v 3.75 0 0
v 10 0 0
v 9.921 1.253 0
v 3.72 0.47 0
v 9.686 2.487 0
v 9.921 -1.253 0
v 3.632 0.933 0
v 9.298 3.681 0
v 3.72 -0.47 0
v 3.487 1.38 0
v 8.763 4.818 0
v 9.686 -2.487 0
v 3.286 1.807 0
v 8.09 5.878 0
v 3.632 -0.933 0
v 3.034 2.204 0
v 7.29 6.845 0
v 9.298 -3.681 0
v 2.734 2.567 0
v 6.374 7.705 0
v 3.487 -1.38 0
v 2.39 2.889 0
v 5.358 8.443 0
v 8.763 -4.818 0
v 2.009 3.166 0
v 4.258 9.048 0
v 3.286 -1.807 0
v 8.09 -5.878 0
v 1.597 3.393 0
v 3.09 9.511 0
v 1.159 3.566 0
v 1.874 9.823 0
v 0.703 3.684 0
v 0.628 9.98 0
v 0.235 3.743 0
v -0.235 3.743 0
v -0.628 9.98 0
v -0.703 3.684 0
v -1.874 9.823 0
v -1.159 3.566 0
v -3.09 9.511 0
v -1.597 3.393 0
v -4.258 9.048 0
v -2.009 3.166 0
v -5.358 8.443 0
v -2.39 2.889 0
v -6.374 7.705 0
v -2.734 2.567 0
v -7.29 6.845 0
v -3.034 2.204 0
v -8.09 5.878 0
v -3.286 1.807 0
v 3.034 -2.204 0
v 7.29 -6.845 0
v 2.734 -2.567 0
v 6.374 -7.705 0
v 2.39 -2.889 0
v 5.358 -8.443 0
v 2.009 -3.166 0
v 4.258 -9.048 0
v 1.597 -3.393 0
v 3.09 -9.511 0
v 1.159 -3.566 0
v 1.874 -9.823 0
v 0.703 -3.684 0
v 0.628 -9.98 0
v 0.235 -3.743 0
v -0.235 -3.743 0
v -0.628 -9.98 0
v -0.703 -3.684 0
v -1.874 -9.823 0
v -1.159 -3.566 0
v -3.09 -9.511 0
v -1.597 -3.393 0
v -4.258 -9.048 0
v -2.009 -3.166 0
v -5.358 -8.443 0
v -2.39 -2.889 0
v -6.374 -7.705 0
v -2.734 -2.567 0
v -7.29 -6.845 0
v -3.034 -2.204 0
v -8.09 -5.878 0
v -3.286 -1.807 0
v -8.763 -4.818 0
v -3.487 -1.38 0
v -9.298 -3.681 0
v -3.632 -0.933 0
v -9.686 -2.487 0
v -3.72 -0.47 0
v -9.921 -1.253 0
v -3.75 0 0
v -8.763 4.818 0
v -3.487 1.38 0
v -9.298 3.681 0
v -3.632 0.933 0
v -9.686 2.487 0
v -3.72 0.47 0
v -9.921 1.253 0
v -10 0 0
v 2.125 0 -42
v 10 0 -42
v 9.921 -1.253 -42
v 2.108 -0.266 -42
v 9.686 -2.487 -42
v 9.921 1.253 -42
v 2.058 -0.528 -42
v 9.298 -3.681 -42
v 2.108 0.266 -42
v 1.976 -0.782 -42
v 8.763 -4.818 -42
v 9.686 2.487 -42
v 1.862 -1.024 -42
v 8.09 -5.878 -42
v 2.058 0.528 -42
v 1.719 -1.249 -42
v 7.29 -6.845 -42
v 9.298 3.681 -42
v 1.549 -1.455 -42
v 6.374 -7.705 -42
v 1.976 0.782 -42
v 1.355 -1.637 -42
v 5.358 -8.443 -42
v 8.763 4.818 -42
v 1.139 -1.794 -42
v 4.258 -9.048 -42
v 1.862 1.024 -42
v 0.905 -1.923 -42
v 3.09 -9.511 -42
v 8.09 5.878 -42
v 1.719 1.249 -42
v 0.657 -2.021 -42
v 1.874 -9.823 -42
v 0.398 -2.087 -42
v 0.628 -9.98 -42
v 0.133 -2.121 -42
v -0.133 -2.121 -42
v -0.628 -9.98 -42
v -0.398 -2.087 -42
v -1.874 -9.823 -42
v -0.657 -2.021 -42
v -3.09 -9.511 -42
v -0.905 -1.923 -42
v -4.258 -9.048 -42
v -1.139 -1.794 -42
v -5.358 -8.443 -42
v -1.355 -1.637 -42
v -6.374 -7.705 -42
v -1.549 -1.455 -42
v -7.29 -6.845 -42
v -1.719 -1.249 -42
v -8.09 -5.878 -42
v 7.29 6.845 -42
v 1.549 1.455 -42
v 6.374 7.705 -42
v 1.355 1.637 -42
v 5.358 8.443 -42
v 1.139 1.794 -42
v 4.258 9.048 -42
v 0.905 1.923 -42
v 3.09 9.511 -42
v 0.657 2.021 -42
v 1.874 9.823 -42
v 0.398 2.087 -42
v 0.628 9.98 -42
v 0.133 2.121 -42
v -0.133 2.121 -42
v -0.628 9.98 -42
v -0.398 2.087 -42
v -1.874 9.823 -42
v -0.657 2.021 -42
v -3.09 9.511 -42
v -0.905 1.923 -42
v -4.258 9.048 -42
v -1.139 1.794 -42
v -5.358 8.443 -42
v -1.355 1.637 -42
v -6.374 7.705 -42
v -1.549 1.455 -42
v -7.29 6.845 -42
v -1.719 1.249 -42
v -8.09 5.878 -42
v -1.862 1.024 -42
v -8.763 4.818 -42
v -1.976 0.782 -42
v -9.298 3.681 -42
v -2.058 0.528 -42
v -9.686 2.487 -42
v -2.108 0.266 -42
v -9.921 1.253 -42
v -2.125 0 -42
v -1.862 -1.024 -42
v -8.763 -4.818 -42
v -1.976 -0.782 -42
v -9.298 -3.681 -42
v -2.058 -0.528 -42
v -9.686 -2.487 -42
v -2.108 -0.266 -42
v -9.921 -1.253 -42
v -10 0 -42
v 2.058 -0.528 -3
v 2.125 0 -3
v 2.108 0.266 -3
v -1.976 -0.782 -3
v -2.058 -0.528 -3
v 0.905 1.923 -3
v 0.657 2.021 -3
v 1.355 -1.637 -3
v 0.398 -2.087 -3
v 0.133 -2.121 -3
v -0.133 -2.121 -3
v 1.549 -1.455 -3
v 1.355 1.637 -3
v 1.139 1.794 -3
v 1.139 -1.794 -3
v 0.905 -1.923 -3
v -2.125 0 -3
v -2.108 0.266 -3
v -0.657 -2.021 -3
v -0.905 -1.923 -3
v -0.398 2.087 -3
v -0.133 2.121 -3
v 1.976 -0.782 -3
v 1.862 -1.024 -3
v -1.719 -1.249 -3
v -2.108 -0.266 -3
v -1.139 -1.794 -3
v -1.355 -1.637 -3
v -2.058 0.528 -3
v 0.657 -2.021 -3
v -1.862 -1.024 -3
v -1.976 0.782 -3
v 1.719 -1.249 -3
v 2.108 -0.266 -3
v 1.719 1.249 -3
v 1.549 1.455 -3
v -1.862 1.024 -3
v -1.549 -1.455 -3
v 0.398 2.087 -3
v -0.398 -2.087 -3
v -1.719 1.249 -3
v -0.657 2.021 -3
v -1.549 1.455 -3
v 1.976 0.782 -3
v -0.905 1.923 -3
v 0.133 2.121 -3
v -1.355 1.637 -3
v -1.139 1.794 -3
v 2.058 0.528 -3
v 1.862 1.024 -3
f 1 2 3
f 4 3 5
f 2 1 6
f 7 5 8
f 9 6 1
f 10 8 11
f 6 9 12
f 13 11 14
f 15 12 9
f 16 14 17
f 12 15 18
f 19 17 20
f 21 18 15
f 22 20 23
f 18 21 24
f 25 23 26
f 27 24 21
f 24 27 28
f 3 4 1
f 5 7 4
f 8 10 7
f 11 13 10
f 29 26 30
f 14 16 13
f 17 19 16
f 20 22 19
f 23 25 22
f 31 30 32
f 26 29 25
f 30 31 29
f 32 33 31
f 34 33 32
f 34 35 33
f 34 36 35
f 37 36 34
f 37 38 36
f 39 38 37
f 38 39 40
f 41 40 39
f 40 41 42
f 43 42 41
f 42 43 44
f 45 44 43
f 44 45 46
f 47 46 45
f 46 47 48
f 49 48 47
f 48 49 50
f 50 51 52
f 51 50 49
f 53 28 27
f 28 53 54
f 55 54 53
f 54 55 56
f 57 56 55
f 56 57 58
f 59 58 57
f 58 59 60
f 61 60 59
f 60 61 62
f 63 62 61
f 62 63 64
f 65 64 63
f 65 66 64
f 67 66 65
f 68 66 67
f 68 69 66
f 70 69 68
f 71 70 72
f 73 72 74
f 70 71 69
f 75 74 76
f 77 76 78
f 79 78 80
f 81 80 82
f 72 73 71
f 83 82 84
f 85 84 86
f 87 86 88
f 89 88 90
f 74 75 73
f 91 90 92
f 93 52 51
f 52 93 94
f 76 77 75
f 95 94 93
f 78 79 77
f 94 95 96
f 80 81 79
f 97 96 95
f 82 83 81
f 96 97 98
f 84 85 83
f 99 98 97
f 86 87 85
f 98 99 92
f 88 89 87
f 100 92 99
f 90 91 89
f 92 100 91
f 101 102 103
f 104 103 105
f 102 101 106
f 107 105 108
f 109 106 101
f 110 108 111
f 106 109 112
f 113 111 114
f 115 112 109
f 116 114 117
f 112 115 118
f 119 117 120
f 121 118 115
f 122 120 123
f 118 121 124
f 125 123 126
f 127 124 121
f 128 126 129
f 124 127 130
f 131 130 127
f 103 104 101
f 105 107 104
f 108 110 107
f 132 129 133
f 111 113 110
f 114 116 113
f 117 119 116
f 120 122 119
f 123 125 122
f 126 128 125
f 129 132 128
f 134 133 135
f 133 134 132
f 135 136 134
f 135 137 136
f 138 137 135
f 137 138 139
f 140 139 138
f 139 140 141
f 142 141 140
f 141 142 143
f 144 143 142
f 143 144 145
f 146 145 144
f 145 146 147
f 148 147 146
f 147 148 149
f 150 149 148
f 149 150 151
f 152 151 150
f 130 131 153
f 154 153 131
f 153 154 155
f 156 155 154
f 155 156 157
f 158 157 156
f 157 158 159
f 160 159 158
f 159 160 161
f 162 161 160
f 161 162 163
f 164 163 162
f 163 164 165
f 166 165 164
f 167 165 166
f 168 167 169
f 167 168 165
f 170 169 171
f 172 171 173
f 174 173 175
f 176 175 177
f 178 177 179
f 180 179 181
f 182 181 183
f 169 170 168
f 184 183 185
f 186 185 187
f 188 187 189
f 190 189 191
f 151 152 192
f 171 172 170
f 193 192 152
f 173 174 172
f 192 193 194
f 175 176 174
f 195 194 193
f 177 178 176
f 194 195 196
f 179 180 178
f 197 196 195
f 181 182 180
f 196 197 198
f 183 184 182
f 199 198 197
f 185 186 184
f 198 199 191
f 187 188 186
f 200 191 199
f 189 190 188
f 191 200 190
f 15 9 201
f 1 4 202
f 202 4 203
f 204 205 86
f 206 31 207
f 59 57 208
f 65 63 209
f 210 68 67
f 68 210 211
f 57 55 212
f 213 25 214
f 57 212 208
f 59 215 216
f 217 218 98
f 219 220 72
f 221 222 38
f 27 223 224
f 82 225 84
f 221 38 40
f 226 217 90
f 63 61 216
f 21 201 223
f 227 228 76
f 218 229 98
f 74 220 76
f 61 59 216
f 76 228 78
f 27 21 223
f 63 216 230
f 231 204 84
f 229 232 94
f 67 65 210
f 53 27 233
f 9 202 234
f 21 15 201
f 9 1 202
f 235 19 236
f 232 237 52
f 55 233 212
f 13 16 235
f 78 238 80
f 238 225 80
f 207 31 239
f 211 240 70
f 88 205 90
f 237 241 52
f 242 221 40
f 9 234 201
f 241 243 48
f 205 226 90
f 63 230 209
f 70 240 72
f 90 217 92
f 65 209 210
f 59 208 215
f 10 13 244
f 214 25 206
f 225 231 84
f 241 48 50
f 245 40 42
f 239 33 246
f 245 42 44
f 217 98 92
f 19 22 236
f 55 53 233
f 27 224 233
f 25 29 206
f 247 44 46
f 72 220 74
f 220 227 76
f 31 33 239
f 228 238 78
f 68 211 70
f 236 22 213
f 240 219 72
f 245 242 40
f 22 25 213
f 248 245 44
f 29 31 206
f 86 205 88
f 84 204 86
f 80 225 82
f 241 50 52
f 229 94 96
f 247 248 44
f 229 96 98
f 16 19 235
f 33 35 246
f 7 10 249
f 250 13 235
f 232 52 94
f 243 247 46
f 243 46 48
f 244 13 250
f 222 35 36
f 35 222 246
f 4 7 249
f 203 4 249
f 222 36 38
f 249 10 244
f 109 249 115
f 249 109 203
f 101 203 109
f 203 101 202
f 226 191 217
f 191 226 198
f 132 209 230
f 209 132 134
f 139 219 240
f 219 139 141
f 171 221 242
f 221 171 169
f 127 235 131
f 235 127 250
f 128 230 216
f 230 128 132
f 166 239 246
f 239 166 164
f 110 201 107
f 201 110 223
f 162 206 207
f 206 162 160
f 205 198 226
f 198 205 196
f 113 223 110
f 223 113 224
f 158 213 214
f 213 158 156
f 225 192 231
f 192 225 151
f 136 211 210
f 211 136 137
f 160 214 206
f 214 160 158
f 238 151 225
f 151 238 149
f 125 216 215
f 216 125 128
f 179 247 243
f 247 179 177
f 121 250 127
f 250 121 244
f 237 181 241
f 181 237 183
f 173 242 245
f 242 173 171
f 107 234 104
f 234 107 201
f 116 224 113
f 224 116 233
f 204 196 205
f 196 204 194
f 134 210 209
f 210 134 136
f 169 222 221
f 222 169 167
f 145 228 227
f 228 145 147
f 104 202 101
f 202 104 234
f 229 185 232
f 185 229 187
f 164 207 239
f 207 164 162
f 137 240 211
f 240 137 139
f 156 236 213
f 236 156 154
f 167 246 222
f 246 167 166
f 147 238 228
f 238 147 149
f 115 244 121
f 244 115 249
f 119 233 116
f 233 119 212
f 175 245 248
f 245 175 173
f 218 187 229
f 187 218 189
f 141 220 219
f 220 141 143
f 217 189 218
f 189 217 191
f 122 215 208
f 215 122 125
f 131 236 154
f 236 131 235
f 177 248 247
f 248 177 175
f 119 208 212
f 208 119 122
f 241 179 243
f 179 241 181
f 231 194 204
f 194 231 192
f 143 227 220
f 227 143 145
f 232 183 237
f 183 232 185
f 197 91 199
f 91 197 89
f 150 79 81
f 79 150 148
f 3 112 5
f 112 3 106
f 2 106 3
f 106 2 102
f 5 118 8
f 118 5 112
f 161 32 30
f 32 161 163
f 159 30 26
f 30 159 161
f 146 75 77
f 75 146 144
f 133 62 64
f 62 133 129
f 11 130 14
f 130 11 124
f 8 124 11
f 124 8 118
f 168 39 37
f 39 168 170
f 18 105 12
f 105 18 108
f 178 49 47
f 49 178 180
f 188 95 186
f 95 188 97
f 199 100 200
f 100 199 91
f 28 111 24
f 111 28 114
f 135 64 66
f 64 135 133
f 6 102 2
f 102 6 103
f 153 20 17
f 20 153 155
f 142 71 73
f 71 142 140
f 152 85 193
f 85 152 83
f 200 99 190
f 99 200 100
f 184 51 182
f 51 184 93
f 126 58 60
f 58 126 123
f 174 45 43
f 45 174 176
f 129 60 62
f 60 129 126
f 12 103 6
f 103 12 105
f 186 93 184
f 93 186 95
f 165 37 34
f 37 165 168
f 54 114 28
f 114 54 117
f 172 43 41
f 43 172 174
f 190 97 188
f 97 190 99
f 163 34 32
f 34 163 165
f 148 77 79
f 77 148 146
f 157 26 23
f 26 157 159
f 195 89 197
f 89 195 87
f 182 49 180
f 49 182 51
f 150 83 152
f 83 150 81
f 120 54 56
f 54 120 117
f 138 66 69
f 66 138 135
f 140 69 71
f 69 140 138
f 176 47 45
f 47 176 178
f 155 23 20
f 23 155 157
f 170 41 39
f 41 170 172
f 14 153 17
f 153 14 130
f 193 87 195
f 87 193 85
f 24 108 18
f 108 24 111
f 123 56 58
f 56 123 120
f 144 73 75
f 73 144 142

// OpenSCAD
$fn = 50;


difference() {
	union() {
		translate(v = [0, 0, -42.0000000000]) {
			cylinder(h = 42, r = 10.0000000000);
		}
		cylinder(h = 0, r = 20.0000000000);
	}
	union() {
		translate(v = [0, 0, 0]) {
			rotate(a = [0, 0, 0]) {
				difference() {
					union() {
						#translate(v = [0, 0, -42.0000000000]) {
							cylinder(h = 42, r = 2.0000000000);
						}
						#translate(v = [0, 0, -3]) {
							cylinder(h = 3, r = 10.0000000000, r1 = 2.1250000000, r2 = 3.7500000000);
						}
						#translate(v = [0, 0, -42.0000000000]) {
							cylinder(h = 42, r = 2.1250000000);
						}
						#translate(v = [0, 0, -42.0000000000]) {
							cylinder(h = 42, r = 2.0000000000);
						}
					}
					union();
				}
			}
		}
	}
}
